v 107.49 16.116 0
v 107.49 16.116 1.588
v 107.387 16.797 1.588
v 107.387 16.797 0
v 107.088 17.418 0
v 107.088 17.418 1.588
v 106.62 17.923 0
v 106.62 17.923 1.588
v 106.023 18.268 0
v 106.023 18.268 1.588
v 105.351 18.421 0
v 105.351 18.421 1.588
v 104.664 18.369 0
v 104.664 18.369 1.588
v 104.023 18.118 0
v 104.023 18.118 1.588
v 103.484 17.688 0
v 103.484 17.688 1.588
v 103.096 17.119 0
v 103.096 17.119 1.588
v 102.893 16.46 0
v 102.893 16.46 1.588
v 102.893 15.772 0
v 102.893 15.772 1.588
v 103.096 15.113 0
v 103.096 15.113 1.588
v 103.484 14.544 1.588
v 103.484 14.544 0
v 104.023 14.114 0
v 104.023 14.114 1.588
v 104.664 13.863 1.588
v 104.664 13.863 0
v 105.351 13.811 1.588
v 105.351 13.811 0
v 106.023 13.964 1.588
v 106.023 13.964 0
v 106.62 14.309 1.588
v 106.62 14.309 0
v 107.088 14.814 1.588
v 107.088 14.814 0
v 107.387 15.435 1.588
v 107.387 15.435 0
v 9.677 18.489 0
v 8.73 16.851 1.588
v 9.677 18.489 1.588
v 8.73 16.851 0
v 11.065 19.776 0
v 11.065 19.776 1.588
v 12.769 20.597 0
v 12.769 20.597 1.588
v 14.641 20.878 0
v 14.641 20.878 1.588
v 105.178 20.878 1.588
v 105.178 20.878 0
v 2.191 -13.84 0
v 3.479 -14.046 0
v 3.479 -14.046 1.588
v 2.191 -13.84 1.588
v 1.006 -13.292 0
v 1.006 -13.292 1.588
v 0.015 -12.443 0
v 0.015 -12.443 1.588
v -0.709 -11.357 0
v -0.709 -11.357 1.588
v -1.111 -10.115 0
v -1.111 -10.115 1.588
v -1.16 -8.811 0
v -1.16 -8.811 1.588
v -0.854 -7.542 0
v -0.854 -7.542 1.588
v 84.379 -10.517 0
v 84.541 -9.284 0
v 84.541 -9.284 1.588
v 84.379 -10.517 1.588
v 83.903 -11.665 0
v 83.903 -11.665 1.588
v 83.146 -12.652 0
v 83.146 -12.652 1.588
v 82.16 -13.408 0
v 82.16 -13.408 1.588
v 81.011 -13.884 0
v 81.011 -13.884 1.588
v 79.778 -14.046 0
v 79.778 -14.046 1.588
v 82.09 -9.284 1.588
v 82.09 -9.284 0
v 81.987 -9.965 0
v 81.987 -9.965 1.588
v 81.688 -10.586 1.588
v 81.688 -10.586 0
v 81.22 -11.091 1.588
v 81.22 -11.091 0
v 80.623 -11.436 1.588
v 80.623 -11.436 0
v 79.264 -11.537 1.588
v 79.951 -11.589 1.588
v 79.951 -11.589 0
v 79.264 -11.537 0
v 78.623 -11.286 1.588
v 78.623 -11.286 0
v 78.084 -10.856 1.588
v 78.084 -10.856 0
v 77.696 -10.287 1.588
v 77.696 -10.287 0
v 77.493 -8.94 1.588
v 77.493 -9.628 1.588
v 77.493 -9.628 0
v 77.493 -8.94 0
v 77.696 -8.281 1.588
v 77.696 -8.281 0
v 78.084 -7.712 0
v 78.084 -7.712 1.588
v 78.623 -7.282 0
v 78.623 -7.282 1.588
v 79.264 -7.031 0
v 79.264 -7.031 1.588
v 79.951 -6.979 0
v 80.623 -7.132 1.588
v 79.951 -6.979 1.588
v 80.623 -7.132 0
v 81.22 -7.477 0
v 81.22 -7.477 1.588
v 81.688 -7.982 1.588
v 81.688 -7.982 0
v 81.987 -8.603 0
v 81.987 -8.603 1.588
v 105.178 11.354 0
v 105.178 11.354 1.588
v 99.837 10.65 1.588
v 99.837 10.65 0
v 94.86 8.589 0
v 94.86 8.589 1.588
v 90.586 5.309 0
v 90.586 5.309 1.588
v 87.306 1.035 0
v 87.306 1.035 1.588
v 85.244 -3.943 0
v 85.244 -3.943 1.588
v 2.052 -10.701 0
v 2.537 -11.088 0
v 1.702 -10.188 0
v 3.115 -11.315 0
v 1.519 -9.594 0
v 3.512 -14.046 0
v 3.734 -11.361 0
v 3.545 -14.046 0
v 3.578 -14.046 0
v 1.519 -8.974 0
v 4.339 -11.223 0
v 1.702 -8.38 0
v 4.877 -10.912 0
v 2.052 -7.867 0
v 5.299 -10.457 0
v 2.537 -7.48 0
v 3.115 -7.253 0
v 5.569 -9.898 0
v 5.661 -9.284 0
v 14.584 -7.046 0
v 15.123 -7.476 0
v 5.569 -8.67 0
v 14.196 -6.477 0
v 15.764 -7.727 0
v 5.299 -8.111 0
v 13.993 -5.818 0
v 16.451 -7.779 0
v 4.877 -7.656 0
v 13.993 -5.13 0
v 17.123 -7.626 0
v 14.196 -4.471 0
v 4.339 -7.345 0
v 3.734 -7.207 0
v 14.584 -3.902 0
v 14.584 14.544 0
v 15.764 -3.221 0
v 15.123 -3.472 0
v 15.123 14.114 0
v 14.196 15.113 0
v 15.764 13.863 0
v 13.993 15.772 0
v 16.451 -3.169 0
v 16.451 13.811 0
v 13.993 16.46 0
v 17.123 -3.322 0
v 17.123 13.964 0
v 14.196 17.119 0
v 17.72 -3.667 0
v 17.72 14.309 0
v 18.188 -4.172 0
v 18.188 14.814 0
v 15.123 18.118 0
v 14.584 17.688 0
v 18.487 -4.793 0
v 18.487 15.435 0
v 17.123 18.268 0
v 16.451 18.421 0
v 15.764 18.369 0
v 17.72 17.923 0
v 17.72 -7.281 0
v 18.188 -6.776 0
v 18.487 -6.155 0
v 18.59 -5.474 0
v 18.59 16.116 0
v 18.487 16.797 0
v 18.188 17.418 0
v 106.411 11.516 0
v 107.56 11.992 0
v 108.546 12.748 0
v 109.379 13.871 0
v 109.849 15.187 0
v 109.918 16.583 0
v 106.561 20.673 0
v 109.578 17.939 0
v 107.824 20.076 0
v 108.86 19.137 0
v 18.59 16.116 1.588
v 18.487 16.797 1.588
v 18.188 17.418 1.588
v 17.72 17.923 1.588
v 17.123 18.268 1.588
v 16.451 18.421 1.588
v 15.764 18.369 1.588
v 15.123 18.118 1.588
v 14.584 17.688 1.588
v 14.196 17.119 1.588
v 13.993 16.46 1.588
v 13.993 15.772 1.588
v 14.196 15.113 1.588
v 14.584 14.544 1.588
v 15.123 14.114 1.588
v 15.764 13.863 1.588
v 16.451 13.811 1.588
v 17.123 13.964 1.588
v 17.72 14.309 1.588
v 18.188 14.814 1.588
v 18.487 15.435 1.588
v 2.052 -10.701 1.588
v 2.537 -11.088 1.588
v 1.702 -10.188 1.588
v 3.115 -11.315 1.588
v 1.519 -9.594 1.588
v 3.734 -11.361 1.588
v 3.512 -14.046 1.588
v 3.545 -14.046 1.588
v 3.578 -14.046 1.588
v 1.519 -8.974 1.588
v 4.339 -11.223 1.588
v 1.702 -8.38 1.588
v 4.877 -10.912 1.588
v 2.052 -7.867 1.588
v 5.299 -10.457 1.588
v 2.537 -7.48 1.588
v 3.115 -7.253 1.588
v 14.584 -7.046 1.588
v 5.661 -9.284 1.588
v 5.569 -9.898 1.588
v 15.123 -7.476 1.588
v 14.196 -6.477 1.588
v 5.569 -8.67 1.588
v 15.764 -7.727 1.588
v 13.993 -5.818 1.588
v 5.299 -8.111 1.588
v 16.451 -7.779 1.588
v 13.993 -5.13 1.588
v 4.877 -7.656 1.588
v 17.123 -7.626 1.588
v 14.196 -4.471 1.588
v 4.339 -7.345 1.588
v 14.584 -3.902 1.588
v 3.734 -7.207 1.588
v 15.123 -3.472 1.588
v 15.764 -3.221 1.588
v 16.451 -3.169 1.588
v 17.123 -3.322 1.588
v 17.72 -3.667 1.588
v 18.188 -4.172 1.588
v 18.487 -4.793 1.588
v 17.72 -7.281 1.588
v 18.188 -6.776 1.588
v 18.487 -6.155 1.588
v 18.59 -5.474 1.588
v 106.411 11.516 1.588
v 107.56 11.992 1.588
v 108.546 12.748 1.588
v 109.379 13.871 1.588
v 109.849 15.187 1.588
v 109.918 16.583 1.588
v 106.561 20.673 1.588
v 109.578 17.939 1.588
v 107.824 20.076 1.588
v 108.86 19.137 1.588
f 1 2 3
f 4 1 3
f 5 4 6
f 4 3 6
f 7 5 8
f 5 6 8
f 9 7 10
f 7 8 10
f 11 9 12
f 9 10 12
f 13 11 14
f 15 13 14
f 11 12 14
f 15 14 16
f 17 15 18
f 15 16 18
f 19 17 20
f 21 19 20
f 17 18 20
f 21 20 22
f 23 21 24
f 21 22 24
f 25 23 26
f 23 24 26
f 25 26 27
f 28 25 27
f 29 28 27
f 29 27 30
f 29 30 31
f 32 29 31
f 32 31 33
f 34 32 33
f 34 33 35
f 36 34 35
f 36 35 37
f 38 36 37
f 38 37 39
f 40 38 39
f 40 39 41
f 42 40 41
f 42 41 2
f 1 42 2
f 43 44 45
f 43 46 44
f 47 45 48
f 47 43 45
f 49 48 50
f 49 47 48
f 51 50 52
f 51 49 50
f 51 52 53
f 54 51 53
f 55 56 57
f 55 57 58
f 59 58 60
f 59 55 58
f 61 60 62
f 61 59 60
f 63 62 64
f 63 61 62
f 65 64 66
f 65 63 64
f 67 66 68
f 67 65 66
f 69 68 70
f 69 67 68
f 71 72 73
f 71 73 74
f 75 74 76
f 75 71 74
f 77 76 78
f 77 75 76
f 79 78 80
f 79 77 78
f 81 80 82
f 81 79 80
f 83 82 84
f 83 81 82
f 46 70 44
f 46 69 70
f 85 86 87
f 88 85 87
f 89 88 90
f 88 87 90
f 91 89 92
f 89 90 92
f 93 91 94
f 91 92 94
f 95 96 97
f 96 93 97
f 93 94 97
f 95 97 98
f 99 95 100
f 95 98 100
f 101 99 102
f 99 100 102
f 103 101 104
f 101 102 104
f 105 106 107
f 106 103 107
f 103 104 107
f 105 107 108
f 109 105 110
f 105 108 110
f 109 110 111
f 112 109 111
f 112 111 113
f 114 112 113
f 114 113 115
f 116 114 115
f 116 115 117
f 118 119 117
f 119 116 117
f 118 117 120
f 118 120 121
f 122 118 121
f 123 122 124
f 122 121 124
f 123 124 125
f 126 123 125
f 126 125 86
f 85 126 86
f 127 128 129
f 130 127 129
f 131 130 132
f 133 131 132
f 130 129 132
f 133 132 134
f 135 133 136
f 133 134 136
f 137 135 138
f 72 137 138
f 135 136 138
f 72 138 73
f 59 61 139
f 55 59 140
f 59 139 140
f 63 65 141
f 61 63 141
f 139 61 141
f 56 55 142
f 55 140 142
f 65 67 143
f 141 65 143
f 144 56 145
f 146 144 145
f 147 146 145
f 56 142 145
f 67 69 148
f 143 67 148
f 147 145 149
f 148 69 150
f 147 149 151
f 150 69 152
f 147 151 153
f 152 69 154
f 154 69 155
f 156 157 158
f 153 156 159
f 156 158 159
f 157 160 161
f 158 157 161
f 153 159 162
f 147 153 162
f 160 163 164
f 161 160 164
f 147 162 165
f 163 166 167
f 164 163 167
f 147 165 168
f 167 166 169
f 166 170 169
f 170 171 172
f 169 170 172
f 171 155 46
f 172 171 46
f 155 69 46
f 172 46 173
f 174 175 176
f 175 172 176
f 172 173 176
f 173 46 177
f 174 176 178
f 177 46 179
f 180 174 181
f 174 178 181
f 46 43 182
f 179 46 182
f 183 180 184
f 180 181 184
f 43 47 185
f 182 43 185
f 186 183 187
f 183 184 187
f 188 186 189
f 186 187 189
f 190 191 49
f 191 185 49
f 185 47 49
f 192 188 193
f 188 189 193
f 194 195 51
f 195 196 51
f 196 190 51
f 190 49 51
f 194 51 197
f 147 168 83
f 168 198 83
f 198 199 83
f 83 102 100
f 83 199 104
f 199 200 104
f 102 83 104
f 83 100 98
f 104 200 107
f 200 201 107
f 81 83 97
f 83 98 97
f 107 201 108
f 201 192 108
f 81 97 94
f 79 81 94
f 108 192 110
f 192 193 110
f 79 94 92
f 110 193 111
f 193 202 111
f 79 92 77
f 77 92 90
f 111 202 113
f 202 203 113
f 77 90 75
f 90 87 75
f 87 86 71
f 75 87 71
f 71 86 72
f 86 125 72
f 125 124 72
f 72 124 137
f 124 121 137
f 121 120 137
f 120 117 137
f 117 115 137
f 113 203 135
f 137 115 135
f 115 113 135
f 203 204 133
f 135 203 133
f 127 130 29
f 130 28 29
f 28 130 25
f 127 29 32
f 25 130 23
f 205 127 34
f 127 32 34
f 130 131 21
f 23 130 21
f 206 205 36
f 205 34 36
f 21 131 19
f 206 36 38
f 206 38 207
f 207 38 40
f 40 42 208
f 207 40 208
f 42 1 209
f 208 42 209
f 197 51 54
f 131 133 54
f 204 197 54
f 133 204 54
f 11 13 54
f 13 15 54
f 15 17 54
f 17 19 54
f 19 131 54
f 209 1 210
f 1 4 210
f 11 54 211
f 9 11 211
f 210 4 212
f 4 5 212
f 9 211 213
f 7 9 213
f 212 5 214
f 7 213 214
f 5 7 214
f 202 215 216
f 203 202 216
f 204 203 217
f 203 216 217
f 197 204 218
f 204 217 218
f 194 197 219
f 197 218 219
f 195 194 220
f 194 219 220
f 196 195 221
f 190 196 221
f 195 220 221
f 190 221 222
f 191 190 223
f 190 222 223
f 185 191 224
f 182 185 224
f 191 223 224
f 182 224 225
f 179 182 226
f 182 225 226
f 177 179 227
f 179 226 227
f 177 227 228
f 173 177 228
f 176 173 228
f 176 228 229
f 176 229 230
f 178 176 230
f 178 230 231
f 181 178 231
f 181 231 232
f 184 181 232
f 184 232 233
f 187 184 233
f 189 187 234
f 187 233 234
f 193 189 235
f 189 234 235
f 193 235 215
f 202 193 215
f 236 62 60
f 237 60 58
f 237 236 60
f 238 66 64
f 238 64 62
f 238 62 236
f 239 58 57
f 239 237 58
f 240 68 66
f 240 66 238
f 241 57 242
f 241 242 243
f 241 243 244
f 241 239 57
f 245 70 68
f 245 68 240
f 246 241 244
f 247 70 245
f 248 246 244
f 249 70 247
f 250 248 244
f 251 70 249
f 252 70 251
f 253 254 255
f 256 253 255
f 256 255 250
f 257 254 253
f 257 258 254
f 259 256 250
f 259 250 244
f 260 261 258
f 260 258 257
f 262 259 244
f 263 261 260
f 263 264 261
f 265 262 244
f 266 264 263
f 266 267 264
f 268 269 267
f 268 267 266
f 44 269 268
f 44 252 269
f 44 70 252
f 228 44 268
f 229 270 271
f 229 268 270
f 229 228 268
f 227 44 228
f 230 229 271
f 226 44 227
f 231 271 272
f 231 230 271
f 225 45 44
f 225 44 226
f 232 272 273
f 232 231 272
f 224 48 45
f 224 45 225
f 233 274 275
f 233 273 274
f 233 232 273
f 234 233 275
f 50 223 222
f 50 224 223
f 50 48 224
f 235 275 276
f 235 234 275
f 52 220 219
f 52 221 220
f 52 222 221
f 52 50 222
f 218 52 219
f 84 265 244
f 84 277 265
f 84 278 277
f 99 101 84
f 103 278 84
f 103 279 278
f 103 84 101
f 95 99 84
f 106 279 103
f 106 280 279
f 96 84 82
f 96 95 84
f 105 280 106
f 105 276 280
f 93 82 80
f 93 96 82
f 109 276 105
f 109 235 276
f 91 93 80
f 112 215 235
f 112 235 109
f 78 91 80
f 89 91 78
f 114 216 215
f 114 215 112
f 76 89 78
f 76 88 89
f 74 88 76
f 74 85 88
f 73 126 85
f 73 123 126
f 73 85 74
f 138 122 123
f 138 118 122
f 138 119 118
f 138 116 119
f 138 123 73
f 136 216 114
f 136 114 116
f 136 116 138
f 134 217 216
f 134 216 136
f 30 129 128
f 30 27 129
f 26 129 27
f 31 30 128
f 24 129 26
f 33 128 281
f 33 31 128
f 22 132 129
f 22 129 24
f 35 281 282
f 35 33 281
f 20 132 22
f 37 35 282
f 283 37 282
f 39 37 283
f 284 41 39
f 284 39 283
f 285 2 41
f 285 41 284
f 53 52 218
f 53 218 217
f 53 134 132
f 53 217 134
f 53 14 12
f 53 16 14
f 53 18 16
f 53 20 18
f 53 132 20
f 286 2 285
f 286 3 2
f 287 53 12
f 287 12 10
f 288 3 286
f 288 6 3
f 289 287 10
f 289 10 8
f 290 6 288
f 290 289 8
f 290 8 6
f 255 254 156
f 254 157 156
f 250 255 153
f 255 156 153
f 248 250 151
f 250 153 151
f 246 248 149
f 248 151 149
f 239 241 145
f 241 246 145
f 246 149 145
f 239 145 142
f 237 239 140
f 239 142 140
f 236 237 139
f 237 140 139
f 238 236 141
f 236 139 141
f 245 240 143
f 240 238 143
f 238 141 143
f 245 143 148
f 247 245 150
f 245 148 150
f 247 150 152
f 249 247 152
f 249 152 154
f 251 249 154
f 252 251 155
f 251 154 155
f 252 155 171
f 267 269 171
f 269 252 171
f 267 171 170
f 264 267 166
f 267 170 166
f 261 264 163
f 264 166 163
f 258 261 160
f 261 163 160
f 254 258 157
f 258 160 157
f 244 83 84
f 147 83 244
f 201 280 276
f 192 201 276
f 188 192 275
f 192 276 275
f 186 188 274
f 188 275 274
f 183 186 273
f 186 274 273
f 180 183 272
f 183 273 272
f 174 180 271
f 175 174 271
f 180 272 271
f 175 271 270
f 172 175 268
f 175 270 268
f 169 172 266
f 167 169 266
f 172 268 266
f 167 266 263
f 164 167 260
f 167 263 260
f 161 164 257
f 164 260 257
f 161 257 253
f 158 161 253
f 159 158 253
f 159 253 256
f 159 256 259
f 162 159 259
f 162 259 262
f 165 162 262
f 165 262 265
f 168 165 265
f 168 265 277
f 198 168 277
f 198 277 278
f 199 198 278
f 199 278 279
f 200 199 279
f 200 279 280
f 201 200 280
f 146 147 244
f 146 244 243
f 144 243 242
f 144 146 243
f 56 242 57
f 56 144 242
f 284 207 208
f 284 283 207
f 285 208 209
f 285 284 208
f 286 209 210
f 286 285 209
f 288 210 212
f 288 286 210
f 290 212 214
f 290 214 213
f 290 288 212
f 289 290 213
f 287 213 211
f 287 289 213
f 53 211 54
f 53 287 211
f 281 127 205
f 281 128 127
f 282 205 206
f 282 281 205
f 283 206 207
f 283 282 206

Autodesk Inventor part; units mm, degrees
ref_plane "YZ Plane" through (0, 0, 0) normal (1, 0, 0) x (0, 1, 0)
ref_plane "XZ Plane" through (0, 0, 0) normal (0, 1, 0) x (-1, 0, 0)
ref_plane "XY Plane" through (0, 0, 0) normal (0, 0, 1) x (1, 0, 0)
sketch "Sketch1" plane through (0, 0, 0) normal (0, 0, 1) x (1, 0, 0)
  arc A0 (79.7785, -14.0465) -> (84.541, -9.284) centre (79.7785, -9.284) ccw
  circle A1 centre (3.5785, -9.284) radius 2.0828
  circle A2 centre (79.7785, -9.284) radius 2.3114
  arc A3 (84.541, 16.116) -> (79.7785, 20.8785) centre (79.7785, 16.116) ccw
  line L0 (23.4149, 20.8785) -> (79.7785, 20.8785)
  line L1 (84.541, 16.116) -> (84.541, -9.284)
  line L2 (79.7785, -14.0465) -> (3.5785, -14.0465)
  arc A4 (3.4793, -14.0455) -> (3.5785, -14.0465) centre (3.5785, -9.284) ccw
  arc A5 (-0.8541, -7.5424) -> (3.5785, -14.0465) centre (3.5785, -9.284) ccw
  line L3 (-0.8541, -7.5424) -> (8.7305, 16.8507)
  line L4 (23.4149, 20.8785) -> (14.6406, 20.8785)
  arc A6 (14.6406, 20.8785) -> (8.7305, 16.8507) centre (14.6406, 14.5285) ccw
  circle A7 centre (79.7785, 16.116) radius 2.0955
  point P0 (0, 0)
  point P1 (3.4793, -14.0455)
  dimension "d1" = 4.6228
  dimension "d5" = 9.525
  dimension "d6" = 6.35
  dimension "d9" = 4.191
  dimension "d25" = 4.1656
extrude "Extrusion1" add sketch "Sketch1" along normal blind 1.5875 contours L2 A4 A5 L3 A6 L4 L0 A3 L1 A0 | A7
sketch "Sketch2" plane through (41.6785, -9.284, 1.5875) normal (0, 0, 1) x (1, 0, 0)
  arc A0 (42.8625, 25.4) -> (38.1, 30.1625) centre (38.1, 25.4) ccw projected
  circle A1 centre (63.5, 25.4) radius 2.3114
  arc A2 (66.8676, 22.0324) -> (63.5, 30.1625) centre (63.5, 25.4) ccw
  line L0 (38.1, 30.1625) -> (63.5, 30.1625)
  arc A3 (38.1, -4.7625) -> (42.8625, 0) centre (38.1, 0) ccw projected
  line L1 (38.1, 30.1625) -> (-27.0379, 30.1625) projected
  line L2 (38.1, 30.1625) -> (35.3924, 30.1625)
  arc A4 (38.1, -4.7625) -> (41.4676, -3.3676) centre (38.1, 0) ccw
  line L3 (41.4676, -3.3676) -> (38.1, 30.1625)
  circle A5 centre (-25.4, 25.4) radius 2.3114
  circle A6 centre (38.1, 0) radius 2.3114 projected
  arc A7 (41.4676, -3.3676) -> (42.8625, 0) centre (38.1, 0) ccw
  arc A8 (63.5, 20.6375) -> (63.5, 30.1625) centre (63.5, 25.4) ccw
  arc A9 (63.5, 20.6375) -> (42.8625, 0) centre (63.5, 0) ccw
  circle A10 centre (-25.4, 3.81) radius 2.3114
  point P0 (-41.6785, 9.284)
  point P1 (66.8676, 22.0324)
  dimension "d15" = 9.525
  dimension "d18" = 4.6228
  dimension "d22" = 4.6228
  dimension "d24" = 4.6228
extrude "Extrusion3" add sketch "Sketch2" against normal blind 1.5875 contours A8 A9 A3 L3 L0 A2
extrude "Extrusion4" cut sketch "Sketch2" against normal blind 1.5875 contours A5 | A10
properties part number "intake_base_outer" material "Acetal Resin, White"
